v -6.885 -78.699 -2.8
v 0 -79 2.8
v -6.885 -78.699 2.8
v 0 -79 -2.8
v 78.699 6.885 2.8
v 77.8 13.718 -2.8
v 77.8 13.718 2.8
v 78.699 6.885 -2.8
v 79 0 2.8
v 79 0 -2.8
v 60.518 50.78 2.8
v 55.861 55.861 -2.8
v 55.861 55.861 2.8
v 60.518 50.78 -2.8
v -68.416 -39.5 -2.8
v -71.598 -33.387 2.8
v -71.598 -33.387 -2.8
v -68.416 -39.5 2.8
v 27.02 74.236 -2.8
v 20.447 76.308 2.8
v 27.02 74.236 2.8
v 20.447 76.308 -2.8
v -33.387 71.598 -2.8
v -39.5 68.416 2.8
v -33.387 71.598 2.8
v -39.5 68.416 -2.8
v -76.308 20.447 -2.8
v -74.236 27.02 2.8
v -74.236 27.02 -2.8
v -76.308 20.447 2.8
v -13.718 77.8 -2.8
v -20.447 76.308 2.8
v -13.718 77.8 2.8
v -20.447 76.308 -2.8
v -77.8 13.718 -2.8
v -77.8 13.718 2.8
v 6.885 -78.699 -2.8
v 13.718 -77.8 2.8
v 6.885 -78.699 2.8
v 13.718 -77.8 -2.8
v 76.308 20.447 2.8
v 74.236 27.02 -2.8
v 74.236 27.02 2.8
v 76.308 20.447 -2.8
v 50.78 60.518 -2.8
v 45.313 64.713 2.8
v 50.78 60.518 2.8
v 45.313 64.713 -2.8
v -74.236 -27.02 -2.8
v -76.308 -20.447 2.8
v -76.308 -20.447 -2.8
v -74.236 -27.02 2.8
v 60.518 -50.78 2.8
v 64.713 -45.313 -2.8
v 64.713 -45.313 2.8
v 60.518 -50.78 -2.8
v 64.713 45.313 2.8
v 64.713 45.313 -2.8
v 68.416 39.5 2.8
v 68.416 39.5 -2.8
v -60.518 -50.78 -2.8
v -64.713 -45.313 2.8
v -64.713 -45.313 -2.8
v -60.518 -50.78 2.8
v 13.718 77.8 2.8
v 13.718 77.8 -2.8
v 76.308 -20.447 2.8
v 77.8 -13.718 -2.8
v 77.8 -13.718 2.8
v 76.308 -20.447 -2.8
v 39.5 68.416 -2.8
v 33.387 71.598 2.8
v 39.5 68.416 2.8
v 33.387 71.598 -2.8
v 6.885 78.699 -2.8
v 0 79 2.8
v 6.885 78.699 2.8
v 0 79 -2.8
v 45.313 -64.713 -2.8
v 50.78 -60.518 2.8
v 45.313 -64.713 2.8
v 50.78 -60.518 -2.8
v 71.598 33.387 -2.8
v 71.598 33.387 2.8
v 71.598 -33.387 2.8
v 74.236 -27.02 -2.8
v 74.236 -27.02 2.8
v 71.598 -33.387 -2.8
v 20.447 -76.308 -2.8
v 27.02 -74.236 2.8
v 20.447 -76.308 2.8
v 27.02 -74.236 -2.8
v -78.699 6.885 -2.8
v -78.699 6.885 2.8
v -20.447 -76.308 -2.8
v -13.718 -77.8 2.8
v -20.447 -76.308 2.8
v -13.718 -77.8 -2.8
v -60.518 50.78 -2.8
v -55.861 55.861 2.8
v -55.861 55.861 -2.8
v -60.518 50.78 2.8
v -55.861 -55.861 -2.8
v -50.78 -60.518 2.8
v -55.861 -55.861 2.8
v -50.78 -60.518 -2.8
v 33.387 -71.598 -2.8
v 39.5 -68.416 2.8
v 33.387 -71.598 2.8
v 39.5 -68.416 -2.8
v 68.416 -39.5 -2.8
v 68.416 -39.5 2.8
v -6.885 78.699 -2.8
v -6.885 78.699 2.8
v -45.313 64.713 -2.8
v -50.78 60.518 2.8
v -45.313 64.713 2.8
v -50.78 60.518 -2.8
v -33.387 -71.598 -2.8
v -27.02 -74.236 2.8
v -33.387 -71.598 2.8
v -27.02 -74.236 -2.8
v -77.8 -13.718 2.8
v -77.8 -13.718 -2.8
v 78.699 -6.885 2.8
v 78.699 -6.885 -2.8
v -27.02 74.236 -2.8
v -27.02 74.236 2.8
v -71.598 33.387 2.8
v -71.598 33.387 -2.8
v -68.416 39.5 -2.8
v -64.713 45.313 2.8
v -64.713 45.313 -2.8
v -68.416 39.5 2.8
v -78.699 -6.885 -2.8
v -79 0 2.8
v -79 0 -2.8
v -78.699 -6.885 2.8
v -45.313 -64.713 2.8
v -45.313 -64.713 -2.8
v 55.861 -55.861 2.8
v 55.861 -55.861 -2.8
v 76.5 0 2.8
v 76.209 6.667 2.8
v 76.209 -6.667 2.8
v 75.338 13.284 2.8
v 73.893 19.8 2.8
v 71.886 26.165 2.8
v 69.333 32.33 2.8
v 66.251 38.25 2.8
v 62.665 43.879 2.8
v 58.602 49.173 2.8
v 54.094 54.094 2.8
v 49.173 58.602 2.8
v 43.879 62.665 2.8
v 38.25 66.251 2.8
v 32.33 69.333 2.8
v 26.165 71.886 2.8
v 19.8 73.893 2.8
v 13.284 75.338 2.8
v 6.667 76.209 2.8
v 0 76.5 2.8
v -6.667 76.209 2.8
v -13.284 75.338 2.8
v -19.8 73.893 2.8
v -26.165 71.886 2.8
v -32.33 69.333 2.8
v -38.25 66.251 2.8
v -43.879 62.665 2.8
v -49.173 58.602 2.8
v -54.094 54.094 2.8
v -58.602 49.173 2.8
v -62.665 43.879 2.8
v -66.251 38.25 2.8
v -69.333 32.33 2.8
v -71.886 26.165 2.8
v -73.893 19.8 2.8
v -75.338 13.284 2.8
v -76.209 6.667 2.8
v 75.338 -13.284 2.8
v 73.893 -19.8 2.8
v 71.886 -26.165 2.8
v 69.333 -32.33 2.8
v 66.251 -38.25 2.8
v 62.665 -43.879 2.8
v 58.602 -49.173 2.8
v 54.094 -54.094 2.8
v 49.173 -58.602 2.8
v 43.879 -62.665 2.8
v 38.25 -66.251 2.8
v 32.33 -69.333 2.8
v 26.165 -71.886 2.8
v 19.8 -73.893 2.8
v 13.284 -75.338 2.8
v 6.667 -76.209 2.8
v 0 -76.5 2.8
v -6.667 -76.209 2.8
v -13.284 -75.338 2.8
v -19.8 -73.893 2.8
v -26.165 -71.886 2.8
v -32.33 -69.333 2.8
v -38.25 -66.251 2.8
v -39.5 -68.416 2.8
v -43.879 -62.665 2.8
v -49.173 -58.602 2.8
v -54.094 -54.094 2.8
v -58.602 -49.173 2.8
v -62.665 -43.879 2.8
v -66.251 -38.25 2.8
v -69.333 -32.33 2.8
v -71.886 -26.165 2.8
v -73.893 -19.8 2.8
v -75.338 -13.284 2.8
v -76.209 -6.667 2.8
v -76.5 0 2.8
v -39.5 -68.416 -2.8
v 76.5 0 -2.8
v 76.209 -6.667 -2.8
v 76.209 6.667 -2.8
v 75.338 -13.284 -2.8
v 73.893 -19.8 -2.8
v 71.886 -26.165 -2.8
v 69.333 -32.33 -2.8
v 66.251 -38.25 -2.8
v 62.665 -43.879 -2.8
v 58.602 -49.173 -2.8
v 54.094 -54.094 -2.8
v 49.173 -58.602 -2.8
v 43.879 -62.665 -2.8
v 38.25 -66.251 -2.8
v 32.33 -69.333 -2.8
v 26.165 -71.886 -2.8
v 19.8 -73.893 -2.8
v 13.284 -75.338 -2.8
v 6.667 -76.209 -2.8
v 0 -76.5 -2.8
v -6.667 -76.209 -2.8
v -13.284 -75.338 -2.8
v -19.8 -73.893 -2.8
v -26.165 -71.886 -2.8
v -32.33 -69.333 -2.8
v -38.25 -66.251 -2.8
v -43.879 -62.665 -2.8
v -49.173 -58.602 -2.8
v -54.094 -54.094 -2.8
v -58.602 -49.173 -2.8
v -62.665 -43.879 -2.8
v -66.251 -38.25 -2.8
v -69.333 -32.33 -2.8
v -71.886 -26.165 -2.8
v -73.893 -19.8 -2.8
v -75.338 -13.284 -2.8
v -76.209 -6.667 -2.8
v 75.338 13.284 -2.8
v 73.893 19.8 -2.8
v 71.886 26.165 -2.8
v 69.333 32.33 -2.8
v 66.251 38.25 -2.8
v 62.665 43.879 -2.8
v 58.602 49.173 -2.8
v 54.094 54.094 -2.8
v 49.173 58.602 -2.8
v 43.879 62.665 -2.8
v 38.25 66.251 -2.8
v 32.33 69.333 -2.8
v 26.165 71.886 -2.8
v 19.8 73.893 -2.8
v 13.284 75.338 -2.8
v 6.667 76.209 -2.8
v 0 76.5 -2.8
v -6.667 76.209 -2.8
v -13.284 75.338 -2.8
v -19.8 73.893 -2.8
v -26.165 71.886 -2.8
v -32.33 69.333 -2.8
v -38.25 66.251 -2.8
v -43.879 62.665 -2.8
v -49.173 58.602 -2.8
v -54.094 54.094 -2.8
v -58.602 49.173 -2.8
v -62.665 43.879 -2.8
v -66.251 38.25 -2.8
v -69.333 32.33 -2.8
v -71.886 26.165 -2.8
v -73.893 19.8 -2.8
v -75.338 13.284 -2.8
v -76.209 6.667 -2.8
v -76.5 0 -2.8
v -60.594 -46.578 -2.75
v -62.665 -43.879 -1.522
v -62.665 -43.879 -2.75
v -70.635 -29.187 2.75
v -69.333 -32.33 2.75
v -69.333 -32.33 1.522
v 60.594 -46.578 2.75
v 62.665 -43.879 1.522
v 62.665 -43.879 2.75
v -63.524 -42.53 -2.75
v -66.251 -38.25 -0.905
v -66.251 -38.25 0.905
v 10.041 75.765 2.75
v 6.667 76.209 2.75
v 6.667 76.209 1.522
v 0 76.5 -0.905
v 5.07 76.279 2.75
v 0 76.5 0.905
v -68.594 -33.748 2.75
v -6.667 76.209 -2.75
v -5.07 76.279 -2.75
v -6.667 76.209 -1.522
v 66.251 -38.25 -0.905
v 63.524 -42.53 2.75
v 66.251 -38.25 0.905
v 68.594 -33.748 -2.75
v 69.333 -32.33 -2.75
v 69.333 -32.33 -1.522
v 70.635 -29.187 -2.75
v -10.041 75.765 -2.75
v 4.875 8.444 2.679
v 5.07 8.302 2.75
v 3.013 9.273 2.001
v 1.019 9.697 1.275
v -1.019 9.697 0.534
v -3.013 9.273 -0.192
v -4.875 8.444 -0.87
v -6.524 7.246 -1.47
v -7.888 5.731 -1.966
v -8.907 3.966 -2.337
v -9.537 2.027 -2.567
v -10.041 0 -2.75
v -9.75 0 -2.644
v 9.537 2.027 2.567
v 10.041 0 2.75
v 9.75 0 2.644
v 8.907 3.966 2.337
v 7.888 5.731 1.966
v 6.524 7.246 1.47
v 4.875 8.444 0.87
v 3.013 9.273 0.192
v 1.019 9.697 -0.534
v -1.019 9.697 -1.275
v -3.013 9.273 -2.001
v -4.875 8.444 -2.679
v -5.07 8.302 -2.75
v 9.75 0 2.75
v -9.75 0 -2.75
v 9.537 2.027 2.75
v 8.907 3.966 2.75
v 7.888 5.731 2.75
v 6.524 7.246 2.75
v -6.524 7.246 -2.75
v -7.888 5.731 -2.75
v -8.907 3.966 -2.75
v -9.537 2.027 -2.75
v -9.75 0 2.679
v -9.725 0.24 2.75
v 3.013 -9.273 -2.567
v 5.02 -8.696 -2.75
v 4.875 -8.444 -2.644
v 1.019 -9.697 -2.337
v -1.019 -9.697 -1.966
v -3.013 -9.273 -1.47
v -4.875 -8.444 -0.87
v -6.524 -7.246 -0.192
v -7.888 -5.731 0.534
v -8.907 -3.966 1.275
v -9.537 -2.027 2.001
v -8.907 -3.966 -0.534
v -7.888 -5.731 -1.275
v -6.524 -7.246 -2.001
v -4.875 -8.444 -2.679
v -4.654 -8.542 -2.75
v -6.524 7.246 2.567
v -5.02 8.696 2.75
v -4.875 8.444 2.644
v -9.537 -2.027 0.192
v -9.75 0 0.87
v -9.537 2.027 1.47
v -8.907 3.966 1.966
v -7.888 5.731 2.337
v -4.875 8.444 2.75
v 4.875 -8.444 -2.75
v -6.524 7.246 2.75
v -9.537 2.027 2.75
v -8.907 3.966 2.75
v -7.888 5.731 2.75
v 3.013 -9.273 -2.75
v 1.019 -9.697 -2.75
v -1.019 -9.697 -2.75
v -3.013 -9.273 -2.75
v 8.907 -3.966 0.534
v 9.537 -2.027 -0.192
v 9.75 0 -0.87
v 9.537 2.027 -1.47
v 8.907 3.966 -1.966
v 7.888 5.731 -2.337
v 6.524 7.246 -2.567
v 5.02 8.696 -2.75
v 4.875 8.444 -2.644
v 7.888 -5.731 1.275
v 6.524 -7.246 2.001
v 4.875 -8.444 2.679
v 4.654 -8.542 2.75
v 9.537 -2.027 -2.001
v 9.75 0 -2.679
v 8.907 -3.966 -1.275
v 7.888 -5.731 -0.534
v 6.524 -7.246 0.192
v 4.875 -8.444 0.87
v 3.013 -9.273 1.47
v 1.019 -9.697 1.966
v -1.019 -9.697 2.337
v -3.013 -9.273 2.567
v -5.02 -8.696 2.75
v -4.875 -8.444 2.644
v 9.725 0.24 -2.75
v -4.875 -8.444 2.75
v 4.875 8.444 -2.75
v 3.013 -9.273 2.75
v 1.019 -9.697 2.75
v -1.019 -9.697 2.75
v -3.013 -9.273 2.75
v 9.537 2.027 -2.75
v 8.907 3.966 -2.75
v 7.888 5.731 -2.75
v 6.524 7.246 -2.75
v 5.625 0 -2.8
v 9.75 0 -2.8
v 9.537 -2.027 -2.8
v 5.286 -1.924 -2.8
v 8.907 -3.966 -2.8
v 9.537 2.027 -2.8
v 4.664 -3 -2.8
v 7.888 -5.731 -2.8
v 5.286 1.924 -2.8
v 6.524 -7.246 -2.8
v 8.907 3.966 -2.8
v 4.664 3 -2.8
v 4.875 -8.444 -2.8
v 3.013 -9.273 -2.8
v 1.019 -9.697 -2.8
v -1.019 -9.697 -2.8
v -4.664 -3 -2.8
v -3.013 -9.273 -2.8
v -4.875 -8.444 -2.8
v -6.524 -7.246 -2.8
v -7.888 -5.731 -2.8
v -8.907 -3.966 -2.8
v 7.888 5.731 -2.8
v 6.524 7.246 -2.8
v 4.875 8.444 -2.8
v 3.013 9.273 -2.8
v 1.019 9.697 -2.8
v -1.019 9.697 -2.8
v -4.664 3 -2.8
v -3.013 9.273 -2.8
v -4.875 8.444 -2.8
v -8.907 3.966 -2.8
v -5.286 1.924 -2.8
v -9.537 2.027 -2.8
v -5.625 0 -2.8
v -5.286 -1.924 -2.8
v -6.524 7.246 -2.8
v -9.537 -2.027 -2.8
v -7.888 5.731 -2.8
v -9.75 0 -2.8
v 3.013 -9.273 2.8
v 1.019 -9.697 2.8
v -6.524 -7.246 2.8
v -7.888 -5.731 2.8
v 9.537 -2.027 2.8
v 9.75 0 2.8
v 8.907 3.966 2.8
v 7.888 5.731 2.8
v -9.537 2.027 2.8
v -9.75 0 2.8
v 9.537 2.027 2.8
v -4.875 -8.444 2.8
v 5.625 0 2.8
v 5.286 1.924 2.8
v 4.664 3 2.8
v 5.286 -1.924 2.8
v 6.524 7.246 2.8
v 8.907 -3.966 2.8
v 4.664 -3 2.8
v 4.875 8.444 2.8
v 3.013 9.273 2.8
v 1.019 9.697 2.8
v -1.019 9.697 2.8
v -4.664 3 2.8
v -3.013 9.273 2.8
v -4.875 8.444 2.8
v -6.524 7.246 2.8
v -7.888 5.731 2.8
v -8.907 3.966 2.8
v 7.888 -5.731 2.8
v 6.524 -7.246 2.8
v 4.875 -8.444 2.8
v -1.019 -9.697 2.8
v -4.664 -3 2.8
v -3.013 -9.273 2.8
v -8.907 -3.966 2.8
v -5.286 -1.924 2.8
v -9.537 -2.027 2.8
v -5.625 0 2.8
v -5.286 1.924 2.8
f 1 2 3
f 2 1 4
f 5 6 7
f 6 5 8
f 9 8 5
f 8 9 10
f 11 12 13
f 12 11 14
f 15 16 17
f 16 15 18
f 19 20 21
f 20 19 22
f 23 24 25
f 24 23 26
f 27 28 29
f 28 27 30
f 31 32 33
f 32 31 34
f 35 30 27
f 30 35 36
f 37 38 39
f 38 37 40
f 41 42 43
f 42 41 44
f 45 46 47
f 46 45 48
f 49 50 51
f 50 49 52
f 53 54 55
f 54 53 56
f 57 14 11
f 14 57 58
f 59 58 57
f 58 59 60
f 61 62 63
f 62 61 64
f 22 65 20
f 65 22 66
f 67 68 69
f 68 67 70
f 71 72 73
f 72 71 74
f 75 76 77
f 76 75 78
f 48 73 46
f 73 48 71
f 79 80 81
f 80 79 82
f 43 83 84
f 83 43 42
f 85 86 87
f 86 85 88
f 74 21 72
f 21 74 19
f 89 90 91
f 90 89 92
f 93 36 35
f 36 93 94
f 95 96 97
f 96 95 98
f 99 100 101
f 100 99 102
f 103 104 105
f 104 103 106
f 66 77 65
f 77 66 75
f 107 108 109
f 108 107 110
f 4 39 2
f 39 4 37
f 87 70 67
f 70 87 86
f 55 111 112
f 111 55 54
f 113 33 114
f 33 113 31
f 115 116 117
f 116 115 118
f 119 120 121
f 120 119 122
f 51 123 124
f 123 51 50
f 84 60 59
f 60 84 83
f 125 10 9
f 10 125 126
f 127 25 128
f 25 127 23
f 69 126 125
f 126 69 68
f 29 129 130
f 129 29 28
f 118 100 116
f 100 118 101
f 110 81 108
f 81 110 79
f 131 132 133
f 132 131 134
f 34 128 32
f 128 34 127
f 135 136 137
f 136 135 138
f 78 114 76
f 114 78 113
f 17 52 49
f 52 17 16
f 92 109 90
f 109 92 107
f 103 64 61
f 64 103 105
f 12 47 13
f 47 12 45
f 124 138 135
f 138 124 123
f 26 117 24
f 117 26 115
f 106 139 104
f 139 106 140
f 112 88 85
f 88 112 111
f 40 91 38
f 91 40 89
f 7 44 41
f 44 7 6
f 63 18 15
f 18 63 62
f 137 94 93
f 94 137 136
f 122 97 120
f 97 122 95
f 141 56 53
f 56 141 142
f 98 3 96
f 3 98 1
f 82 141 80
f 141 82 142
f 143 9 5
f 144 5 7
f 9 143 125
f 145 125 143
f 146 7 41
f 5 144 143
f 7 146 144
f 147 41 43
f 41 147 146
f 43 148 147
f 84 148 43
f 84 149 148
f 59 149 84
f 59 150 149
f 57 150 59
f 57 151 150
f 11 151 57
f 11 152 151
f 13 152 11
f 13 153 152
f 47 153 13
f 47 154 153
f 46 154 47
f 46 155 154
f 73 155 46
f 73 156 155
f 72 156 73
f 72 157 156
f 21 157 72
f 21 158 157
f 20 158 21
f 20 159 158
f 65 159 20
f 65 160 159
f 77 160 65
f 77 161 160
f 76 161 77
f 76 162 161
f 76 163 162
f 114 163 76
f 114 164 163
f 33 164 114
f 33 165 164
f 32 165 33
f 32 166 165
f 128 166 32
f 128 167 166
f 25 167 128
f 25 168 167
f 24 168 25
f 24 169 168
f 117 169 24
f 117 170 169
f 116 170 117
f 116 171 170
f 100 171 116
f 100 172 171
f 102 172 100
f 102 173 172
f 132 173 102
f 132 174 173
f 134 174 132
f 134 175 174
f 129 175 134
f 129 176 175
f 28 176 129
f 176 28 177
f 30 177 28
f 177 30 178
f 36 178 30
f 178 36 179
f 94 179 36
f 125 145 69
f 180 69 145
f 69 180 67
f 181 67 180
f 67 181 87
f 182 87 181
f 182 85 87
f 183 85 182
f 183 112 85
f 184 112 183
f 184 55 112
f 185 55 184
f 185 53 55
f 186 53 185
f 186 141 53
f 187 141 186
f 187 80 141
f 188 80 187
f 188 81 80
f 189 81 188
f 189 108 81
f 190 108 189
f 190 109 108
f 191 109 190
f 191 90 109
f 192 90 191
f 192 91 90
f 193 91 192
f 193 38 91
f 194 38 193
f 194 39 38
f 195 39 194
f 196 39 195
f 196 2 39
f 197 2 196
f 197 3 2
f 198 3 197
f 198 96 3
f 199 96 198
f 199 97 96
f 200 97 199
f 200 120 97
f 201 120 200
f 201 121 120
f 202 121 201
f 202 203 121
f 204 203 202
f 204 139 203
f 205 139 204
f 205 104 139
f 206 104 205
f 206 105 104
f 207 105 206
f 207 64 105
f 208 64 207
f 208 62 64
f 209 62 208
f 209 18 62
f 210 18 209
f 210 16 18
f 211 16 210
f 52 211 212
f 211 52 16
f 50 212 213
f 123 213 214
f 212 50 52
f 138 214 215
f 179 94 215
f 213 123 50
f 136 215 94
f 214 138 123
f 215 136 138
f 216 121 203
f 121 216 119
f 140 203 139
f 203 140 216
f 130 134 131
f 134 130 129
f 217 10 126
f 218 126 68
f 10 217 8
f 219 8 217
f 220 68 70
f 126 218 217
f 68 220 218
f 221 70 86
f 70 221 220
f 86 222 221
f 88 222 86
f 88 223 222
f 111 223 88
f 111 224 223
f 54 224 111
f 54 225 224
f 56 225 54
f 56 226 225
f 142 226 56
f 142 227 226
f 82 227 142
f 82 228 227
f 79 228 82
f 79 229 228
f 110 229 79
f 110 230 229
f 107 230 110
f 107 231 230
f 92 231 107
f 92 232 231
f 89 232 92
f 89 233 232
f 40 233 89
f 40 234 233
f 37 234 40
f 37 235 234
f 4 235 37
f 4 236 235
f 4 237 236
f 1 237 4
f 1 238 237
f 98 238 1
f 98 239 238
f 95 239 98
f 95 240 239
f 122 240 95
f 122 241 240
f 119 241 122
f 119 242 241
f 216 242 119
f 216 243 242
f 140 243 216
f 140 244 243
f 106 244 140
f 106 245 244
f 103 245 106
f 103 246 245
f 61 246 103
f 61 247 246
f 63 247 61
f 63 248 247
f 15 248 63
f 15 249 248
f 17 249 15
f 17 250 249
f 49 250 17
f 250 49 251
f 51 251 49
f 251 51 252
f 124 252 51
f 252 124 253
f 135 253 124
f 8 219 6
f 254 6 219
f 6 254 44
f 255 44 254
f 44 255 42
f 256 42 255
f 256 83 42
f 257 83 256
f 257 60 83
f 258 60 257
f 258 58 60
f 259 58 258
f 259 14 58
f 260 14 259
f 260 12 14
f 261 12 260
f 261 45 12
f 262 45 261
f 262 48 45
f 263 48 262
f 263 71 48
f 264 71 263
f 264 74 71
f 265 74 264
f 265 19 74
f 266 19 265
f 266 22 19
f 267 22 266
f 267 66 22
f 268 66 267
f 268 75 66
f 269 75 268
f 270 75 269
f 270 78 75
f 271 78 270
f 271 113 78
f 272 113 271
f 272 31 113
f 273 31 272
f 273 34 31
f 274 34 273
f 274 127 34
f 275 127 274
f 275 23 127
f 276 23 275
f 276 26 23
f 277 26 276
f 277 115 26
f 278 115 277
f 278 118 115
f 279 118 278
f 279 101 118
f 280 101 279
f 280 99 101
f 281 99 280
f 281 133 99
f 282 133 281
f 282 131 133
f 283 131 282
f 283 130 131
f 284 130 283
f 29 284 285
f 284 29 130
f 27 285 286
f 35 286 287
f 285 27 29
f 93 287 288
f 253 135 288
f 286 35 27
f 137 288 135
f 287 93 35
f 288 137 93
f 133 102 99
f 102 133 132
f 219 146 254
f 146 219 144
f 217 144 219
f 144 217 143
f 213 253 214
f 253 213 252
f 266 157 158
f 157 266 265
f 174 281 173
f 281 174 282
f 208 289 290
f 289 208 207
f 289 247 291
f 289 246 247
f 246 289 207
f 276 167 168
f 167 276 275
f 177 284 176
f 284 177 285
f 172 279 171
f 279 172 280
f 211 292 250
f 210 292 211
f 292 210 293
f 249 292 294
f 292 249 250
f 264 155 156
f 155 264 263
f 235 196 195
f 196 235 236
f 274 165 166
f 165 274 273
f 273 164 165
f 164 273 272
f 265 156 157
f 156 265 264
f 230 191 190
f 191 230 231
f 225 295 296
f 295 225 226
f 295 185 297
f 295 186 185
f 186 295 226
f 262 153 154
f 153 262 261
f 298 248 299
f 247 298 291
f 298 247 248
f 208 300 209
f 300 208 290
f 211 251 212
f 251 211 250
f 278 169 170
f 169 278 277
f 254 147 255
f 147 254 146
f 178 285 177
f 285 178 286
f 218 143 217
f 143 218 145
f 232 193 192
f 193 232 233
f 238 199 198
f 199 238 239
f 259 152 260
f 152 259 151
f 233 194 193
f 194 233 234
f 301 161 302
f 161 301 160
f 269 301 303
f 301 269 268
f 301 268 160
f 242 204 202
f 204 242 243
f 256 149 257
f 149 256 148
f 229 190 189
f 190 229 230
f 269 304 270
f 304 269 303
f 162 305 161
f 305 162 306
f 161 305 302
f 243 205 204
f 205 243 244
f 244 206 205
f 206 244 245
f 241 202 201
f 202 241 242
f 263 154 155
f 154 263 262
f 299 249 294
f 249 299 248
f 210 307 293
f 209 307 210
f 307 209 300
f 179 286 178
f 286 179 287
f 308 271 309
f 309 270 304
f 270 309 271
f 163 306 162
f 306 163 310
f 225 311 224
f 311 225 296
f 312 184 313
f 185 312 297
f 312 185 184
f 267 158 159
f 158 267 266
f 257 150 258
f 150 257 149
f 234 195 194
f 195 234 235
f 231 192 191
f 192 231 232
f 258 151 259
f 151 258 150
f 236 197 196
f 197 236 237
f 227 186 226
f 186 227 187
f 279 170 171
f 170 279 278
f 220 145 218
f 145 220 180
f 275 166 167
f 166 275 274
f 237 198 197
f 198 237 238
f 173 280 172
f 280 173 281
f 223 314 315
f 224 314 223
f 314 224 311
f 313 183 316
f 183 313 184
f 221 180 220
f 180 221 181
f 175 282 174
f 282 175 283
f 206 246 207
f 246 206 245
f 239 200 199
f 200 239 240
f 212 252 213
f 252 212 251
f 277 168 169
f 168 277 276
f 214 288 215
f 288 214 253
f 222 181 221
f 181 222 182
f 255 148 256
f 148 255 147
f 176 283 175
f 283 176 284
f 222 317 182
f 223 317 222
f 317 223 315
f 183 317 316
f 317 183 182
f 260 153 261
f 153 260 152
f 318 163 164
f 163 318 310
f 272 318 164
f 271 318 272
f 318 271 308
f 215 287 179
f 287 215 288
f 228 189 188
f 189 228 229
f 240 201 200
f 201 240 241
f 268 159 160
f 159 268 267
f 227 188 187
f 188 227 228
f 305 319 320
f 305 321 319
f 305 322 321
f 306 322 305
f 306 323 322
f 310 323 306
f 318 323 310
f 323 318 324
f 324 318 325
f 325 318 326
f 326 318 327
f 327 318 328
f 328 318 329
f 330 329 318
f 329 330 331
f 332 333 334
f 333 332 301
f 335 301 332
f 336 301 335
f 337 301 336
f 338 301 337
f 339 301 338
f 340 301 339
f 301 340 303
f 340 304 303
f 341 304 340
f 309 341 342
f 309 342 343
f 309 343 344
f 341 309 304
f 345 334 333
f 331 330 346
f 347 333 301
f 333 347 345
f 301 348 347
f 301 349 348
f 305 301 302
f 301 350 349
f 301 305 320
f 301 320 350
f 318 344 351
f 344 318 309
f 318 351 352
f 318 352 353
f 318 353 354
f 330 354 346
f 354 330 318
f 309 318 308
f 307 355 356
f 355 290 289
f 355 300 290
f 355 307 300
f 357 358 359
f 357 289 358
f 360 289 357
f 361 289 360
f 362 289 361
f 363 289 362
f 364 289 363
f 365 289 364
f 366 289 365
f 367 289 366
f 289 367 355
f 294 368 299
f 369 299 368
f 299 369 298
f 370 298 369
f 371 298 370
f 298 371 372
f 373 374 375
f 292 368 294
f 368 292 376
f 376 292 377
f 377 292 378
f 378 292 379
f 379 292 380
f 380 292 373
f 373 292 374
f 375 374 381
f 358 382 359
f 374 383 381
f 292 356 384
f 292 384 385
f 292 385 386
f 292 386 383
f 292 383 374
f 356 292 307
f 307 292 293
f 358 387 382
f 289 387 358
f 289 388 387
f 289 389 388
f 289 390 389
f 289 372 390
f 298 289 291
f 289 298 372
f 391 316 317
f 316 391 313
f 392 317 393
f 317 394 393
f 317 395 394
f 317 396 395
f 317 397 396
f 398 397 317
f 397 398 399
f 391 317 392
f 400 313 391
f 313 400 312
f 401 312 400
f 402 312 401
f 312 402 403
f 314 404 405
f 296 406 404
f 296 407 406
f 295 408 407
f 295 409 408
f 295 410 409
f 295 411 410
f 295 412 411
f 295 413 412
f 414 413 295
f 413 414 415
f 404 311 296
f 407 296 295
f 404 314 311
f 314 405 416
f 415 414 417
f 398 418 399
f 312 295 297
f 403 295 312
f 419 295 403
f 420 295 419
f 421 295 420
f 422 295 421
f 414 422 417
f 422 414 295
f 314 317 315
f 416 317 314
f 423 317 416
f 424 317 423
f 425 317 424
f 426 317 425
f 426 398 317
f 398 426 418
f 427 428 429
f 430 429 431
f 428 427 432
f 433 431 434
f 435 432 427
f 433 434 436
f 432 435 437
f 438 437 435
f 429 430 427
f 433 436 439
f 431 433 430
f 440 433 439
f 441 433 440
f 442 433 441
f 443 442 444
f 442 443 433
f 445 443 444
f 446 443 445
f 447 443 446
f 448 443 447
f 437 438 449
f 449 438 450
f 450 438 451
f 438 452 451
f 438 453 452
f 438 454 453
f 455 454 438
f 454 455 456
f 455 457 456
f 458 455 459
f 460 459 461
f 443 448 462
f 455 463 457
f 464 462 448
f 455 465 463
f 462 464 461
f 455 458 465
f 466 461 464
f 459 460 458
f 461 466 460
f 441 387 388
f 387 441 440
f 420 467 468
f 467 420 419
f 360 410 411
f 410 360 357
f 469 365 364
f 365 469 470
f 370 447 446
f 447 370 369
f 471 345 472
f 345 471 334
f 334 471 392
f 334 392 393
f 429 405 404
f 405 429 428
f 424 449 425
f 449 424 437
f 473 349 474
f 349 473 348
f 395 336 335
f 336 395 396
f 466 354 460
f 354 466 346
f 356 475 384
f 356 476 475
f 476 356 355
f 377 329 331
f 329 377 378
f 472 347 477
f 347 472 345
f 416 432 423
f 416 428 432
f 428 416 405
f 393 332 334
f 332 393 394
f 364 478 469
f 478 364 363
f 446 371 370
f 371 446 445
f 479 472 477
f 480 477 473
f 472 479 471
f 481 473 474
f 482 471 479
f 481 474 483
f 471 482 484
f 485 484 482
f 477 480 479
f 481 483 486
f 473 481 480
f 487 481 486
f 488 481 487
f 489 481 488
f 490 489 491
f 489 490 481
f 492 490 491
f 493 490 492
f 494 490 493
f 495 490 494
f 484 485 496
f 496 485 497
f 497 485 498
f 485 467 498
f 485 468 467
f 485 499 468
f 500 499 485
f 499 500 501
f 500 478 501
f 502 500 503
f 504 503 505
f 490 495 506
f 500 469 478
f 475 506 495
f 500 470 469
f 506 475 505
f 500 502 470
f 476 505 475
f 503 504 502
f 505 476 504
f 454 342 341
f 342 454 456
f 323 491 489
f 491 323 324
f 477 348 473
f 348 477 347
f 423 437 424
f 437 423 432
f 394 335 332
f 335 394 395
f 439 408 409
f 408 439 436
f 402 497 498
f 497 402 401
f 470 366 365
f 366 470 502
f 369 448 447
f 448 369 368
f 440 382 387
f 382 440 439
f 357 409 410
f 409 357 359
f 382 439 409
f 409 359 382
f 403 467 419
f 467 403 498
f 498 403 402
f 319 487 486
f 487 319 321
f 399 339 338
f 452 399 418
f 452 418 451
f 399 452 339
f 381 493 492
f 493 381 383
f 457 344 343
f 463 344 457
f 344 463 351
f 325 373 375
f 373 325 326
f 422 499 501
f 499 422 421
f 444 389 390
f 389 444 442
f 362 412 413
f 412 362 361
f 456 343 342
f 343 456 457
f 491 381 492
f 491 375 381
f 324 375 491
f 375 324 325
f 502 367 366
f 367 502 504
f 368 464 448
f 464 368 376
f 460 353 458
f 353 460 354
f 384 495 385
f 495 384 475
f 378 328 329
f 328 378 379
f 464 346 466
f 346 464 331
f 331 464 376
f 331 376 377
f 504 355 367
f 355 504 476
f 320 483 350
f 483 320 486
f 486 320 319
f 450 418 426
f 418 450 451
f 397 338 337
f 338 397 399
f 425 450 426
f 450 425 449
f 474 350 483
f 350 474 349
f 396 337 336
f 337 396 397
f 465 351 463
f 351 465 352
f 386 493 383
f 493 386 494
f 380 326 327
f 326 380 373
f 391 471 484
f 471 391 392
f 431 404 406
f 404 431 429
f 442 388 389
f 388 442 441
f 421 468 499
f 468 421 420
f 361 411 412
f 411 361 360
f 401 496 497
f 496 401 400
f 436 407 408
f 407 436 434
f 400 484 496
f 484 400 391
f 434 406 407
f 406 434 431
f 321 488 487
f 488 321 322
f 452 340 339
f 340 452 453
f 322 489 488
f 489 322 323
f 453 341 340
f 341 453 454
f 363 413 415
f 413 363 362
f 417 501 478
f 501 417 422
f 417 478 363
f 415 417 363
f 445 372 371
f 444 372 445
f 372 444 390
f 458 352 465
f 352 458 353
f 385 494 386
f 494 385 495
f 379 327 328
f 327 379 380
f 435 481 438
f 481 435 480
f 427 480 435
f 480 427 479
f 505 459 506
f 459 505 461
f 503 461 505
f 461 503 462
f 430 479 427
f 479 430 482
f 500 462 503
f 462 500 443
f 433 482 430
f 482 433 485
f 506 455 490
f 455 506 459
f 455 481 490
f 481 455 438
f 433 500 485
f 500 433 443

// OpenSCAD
// Thickness of outer ring wall.
outer_ring_thickness = 2.5;
outer_ring_od = 158;
blade_thickness = 1.7;
blade_angle = -20;
hub_od = 19.5;
slot_width = 11.25;
slot_length = 6;

// Overall height of the whole propeller.
thickness = 5.5;

// Rotational offset of first blade (to match originals).
rotational_offset = 90;

// Number of blades.
n_blades = 3;

/* [Hidden] */
slop = 0.1;

module ring() {
  difference() {
    cylinder(h = thickness + slop, r = outer_ring_od/2, center = true, $fa = 5, $fs = 0.5);
    cylinder(h = thickness + 2*slop, r = outer_ring_od/2 - outer_ring_thickness, center = true, $fa = 5, $fs = 0.5);
  }
}

module blade() {
  difference() {
    difference() {
      rotate([blade_angle, 0, 0])
      translate([0, -25, -blade_thickness/2])
      cube([outer_ring_od/2 - outer_ring_thickness/2, 50, blade_thickness]);
    }
    translate([0, 0, thickness/2 + 10])
    cube([outer_ring_od, outer_ring_od, 20], center=true);
    translate([0, 0, -(thickness/2 + 10)])
    cube([outer_ring_od, outer_ring_od, 20], center=true);
  }
}

module blades() {
  for (i = [0 : n_blades - 1]) {
    rotate([0, 0, rotational_offset + i * 360/n_blades]) blade();
  }
}

module slot() {
  intersection() {
    cylinder(h = 2*thickness, r = slot_width/2, center = true);
    cube([slot_width + slop, slot_length, 2*thickness], center = true);
  }
}

module hub() {
  difference() {
    cylinder(h = thickness + slop, r = hub_od/2, center = true);
  }
}

difference() {
  union() {
    ring();
    blades();
    hub();
  }
  slot();
}
